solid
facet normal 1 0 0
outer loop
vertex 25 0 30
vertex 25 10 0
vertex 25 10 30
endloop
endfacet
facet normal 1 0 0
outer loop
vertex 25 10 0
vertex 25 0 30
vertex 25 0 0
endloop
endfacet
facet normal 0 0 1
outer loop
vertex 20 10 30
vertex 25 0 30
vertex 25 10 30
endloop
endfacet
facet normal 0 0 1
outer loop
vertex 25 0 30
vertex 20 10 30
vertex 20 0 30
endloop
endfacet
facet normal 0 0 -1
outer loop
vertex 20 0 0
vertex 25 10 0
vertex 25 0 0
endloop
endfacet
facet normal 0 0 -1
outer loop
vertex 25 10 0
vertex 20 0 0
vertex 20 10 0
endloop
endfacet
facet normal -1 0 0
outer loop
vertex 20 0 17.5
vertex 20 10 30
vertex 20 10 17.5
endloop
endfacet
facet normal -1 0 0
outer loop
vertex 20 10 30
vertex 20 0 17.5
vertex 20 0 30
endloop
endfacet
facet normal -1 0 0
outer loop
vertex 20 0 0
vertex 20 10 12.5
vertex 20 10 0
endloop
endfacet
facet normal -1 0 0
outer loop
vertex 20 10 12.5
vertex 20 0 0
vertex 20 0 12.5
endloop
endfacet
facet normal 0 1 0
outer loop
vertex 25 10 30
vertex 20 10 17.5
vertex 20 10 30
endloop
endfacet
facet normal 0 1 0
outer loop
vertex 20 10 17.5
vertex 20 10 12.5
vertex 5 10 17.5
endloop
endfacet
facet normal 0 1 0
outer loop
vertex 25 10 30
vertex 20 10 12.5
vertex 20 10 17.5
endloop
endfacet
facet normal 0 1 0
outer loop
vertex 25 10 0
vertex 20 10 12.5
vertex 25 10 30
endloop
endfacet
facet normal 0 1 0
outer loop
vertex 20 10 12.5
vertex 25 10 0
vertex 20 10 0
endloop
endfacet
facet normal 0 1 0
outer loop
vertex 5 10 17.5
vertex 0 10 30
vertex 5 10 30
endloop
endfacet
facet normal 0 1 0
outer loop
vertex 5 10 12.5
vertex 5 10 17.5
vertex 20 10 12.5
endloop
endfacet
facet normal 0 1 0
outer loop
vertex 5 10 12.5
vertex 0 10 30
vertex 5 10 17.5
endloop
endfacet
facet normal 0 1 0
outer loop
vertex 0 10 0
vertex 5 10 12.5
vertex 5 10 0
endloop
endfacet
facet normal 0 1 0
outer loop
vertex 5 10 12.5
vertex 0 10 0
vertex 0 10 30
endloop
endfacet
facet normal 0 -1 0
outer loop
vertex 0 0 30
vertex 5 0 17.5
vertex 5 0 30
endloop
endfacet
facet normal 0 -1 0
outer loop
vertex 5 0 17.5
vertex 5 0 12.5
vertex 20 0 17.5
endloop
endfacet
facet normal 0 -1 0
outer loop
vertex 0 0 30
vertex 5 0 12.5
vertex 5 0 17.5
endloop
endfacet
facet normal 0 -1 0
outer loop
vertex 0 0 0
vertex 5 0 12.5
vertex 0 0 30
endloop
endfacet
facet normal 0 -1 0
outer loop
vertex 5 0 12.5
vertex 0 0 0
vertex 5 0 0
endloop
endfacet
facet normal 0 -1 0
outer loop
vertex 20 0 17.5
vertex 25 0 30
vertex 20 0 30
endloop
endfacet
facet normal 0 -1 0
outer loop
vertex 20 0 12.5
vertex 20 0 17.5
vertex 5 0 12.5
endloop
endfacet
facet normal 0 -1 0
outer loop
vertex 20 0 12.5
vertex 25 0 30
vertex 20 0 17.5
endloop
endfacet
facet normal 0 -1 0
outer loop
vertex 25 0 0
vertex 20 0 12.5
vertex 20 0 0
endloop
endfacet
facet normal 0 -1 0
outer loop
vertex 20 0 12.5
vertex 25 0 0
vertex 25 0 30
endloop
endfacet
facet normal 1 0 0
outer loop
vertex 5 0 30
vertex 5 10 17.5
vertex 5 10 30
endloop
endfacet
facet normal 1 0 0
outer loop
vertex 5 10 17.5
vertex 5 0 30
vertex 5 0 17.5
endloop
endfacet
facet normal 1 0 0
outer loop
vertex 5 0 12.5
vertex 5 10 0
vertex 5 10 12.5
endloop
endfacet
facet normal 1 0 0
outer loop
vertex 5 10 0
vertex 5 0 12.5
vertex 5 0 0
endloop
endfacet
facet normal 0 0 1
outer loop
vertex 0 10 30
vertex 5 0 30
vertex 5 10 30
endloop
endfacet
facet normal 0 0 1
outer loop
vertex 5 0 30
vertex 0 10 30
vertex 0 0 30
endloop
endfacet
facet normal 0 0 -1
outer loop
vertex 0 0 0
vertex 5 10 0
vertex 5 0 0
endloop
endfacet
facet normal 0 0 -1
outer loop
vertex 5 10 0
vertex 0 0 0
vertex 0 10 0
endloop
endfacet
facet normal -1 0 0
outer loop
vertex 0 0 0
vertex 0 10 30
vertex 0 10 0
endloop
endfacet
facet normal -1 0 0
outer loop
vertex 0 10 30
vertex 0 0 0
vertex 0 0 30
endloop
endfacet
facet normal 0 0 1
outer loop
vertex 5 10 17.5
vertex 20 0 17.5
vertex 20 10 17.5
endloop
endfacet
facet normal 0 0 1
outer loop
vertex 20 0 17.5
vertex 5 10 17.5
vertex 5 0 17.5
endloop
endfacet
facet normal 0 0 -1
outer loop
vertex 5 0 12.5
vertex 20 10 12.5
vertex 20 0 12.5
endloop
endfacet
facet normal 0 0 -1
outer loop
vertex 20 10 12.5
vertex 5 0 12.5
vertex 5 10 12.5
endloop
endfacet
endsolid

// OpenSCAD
// simple l bar for support testing
//
//   ^        |----w2-----| -
//   |    -    ************ |
//   |    |    ************ h2
//   |    h1   ****         -
//   |    |    ****
//   |    -    ****
//   |        |-w1-|
//   z
//    x ---------------------------->
//
// depth is how far the model goes in y

height = 30;
width = 20;
thickness = 5;
depth = 10;

union() {
translate([width, 0, 0])
cube([ thickness, depth, height ], false);

cube([ thickness, depth, height ], false);

translate([0, 0, (height-thickness)/2])
cube([width, depth, thickness]);
}
